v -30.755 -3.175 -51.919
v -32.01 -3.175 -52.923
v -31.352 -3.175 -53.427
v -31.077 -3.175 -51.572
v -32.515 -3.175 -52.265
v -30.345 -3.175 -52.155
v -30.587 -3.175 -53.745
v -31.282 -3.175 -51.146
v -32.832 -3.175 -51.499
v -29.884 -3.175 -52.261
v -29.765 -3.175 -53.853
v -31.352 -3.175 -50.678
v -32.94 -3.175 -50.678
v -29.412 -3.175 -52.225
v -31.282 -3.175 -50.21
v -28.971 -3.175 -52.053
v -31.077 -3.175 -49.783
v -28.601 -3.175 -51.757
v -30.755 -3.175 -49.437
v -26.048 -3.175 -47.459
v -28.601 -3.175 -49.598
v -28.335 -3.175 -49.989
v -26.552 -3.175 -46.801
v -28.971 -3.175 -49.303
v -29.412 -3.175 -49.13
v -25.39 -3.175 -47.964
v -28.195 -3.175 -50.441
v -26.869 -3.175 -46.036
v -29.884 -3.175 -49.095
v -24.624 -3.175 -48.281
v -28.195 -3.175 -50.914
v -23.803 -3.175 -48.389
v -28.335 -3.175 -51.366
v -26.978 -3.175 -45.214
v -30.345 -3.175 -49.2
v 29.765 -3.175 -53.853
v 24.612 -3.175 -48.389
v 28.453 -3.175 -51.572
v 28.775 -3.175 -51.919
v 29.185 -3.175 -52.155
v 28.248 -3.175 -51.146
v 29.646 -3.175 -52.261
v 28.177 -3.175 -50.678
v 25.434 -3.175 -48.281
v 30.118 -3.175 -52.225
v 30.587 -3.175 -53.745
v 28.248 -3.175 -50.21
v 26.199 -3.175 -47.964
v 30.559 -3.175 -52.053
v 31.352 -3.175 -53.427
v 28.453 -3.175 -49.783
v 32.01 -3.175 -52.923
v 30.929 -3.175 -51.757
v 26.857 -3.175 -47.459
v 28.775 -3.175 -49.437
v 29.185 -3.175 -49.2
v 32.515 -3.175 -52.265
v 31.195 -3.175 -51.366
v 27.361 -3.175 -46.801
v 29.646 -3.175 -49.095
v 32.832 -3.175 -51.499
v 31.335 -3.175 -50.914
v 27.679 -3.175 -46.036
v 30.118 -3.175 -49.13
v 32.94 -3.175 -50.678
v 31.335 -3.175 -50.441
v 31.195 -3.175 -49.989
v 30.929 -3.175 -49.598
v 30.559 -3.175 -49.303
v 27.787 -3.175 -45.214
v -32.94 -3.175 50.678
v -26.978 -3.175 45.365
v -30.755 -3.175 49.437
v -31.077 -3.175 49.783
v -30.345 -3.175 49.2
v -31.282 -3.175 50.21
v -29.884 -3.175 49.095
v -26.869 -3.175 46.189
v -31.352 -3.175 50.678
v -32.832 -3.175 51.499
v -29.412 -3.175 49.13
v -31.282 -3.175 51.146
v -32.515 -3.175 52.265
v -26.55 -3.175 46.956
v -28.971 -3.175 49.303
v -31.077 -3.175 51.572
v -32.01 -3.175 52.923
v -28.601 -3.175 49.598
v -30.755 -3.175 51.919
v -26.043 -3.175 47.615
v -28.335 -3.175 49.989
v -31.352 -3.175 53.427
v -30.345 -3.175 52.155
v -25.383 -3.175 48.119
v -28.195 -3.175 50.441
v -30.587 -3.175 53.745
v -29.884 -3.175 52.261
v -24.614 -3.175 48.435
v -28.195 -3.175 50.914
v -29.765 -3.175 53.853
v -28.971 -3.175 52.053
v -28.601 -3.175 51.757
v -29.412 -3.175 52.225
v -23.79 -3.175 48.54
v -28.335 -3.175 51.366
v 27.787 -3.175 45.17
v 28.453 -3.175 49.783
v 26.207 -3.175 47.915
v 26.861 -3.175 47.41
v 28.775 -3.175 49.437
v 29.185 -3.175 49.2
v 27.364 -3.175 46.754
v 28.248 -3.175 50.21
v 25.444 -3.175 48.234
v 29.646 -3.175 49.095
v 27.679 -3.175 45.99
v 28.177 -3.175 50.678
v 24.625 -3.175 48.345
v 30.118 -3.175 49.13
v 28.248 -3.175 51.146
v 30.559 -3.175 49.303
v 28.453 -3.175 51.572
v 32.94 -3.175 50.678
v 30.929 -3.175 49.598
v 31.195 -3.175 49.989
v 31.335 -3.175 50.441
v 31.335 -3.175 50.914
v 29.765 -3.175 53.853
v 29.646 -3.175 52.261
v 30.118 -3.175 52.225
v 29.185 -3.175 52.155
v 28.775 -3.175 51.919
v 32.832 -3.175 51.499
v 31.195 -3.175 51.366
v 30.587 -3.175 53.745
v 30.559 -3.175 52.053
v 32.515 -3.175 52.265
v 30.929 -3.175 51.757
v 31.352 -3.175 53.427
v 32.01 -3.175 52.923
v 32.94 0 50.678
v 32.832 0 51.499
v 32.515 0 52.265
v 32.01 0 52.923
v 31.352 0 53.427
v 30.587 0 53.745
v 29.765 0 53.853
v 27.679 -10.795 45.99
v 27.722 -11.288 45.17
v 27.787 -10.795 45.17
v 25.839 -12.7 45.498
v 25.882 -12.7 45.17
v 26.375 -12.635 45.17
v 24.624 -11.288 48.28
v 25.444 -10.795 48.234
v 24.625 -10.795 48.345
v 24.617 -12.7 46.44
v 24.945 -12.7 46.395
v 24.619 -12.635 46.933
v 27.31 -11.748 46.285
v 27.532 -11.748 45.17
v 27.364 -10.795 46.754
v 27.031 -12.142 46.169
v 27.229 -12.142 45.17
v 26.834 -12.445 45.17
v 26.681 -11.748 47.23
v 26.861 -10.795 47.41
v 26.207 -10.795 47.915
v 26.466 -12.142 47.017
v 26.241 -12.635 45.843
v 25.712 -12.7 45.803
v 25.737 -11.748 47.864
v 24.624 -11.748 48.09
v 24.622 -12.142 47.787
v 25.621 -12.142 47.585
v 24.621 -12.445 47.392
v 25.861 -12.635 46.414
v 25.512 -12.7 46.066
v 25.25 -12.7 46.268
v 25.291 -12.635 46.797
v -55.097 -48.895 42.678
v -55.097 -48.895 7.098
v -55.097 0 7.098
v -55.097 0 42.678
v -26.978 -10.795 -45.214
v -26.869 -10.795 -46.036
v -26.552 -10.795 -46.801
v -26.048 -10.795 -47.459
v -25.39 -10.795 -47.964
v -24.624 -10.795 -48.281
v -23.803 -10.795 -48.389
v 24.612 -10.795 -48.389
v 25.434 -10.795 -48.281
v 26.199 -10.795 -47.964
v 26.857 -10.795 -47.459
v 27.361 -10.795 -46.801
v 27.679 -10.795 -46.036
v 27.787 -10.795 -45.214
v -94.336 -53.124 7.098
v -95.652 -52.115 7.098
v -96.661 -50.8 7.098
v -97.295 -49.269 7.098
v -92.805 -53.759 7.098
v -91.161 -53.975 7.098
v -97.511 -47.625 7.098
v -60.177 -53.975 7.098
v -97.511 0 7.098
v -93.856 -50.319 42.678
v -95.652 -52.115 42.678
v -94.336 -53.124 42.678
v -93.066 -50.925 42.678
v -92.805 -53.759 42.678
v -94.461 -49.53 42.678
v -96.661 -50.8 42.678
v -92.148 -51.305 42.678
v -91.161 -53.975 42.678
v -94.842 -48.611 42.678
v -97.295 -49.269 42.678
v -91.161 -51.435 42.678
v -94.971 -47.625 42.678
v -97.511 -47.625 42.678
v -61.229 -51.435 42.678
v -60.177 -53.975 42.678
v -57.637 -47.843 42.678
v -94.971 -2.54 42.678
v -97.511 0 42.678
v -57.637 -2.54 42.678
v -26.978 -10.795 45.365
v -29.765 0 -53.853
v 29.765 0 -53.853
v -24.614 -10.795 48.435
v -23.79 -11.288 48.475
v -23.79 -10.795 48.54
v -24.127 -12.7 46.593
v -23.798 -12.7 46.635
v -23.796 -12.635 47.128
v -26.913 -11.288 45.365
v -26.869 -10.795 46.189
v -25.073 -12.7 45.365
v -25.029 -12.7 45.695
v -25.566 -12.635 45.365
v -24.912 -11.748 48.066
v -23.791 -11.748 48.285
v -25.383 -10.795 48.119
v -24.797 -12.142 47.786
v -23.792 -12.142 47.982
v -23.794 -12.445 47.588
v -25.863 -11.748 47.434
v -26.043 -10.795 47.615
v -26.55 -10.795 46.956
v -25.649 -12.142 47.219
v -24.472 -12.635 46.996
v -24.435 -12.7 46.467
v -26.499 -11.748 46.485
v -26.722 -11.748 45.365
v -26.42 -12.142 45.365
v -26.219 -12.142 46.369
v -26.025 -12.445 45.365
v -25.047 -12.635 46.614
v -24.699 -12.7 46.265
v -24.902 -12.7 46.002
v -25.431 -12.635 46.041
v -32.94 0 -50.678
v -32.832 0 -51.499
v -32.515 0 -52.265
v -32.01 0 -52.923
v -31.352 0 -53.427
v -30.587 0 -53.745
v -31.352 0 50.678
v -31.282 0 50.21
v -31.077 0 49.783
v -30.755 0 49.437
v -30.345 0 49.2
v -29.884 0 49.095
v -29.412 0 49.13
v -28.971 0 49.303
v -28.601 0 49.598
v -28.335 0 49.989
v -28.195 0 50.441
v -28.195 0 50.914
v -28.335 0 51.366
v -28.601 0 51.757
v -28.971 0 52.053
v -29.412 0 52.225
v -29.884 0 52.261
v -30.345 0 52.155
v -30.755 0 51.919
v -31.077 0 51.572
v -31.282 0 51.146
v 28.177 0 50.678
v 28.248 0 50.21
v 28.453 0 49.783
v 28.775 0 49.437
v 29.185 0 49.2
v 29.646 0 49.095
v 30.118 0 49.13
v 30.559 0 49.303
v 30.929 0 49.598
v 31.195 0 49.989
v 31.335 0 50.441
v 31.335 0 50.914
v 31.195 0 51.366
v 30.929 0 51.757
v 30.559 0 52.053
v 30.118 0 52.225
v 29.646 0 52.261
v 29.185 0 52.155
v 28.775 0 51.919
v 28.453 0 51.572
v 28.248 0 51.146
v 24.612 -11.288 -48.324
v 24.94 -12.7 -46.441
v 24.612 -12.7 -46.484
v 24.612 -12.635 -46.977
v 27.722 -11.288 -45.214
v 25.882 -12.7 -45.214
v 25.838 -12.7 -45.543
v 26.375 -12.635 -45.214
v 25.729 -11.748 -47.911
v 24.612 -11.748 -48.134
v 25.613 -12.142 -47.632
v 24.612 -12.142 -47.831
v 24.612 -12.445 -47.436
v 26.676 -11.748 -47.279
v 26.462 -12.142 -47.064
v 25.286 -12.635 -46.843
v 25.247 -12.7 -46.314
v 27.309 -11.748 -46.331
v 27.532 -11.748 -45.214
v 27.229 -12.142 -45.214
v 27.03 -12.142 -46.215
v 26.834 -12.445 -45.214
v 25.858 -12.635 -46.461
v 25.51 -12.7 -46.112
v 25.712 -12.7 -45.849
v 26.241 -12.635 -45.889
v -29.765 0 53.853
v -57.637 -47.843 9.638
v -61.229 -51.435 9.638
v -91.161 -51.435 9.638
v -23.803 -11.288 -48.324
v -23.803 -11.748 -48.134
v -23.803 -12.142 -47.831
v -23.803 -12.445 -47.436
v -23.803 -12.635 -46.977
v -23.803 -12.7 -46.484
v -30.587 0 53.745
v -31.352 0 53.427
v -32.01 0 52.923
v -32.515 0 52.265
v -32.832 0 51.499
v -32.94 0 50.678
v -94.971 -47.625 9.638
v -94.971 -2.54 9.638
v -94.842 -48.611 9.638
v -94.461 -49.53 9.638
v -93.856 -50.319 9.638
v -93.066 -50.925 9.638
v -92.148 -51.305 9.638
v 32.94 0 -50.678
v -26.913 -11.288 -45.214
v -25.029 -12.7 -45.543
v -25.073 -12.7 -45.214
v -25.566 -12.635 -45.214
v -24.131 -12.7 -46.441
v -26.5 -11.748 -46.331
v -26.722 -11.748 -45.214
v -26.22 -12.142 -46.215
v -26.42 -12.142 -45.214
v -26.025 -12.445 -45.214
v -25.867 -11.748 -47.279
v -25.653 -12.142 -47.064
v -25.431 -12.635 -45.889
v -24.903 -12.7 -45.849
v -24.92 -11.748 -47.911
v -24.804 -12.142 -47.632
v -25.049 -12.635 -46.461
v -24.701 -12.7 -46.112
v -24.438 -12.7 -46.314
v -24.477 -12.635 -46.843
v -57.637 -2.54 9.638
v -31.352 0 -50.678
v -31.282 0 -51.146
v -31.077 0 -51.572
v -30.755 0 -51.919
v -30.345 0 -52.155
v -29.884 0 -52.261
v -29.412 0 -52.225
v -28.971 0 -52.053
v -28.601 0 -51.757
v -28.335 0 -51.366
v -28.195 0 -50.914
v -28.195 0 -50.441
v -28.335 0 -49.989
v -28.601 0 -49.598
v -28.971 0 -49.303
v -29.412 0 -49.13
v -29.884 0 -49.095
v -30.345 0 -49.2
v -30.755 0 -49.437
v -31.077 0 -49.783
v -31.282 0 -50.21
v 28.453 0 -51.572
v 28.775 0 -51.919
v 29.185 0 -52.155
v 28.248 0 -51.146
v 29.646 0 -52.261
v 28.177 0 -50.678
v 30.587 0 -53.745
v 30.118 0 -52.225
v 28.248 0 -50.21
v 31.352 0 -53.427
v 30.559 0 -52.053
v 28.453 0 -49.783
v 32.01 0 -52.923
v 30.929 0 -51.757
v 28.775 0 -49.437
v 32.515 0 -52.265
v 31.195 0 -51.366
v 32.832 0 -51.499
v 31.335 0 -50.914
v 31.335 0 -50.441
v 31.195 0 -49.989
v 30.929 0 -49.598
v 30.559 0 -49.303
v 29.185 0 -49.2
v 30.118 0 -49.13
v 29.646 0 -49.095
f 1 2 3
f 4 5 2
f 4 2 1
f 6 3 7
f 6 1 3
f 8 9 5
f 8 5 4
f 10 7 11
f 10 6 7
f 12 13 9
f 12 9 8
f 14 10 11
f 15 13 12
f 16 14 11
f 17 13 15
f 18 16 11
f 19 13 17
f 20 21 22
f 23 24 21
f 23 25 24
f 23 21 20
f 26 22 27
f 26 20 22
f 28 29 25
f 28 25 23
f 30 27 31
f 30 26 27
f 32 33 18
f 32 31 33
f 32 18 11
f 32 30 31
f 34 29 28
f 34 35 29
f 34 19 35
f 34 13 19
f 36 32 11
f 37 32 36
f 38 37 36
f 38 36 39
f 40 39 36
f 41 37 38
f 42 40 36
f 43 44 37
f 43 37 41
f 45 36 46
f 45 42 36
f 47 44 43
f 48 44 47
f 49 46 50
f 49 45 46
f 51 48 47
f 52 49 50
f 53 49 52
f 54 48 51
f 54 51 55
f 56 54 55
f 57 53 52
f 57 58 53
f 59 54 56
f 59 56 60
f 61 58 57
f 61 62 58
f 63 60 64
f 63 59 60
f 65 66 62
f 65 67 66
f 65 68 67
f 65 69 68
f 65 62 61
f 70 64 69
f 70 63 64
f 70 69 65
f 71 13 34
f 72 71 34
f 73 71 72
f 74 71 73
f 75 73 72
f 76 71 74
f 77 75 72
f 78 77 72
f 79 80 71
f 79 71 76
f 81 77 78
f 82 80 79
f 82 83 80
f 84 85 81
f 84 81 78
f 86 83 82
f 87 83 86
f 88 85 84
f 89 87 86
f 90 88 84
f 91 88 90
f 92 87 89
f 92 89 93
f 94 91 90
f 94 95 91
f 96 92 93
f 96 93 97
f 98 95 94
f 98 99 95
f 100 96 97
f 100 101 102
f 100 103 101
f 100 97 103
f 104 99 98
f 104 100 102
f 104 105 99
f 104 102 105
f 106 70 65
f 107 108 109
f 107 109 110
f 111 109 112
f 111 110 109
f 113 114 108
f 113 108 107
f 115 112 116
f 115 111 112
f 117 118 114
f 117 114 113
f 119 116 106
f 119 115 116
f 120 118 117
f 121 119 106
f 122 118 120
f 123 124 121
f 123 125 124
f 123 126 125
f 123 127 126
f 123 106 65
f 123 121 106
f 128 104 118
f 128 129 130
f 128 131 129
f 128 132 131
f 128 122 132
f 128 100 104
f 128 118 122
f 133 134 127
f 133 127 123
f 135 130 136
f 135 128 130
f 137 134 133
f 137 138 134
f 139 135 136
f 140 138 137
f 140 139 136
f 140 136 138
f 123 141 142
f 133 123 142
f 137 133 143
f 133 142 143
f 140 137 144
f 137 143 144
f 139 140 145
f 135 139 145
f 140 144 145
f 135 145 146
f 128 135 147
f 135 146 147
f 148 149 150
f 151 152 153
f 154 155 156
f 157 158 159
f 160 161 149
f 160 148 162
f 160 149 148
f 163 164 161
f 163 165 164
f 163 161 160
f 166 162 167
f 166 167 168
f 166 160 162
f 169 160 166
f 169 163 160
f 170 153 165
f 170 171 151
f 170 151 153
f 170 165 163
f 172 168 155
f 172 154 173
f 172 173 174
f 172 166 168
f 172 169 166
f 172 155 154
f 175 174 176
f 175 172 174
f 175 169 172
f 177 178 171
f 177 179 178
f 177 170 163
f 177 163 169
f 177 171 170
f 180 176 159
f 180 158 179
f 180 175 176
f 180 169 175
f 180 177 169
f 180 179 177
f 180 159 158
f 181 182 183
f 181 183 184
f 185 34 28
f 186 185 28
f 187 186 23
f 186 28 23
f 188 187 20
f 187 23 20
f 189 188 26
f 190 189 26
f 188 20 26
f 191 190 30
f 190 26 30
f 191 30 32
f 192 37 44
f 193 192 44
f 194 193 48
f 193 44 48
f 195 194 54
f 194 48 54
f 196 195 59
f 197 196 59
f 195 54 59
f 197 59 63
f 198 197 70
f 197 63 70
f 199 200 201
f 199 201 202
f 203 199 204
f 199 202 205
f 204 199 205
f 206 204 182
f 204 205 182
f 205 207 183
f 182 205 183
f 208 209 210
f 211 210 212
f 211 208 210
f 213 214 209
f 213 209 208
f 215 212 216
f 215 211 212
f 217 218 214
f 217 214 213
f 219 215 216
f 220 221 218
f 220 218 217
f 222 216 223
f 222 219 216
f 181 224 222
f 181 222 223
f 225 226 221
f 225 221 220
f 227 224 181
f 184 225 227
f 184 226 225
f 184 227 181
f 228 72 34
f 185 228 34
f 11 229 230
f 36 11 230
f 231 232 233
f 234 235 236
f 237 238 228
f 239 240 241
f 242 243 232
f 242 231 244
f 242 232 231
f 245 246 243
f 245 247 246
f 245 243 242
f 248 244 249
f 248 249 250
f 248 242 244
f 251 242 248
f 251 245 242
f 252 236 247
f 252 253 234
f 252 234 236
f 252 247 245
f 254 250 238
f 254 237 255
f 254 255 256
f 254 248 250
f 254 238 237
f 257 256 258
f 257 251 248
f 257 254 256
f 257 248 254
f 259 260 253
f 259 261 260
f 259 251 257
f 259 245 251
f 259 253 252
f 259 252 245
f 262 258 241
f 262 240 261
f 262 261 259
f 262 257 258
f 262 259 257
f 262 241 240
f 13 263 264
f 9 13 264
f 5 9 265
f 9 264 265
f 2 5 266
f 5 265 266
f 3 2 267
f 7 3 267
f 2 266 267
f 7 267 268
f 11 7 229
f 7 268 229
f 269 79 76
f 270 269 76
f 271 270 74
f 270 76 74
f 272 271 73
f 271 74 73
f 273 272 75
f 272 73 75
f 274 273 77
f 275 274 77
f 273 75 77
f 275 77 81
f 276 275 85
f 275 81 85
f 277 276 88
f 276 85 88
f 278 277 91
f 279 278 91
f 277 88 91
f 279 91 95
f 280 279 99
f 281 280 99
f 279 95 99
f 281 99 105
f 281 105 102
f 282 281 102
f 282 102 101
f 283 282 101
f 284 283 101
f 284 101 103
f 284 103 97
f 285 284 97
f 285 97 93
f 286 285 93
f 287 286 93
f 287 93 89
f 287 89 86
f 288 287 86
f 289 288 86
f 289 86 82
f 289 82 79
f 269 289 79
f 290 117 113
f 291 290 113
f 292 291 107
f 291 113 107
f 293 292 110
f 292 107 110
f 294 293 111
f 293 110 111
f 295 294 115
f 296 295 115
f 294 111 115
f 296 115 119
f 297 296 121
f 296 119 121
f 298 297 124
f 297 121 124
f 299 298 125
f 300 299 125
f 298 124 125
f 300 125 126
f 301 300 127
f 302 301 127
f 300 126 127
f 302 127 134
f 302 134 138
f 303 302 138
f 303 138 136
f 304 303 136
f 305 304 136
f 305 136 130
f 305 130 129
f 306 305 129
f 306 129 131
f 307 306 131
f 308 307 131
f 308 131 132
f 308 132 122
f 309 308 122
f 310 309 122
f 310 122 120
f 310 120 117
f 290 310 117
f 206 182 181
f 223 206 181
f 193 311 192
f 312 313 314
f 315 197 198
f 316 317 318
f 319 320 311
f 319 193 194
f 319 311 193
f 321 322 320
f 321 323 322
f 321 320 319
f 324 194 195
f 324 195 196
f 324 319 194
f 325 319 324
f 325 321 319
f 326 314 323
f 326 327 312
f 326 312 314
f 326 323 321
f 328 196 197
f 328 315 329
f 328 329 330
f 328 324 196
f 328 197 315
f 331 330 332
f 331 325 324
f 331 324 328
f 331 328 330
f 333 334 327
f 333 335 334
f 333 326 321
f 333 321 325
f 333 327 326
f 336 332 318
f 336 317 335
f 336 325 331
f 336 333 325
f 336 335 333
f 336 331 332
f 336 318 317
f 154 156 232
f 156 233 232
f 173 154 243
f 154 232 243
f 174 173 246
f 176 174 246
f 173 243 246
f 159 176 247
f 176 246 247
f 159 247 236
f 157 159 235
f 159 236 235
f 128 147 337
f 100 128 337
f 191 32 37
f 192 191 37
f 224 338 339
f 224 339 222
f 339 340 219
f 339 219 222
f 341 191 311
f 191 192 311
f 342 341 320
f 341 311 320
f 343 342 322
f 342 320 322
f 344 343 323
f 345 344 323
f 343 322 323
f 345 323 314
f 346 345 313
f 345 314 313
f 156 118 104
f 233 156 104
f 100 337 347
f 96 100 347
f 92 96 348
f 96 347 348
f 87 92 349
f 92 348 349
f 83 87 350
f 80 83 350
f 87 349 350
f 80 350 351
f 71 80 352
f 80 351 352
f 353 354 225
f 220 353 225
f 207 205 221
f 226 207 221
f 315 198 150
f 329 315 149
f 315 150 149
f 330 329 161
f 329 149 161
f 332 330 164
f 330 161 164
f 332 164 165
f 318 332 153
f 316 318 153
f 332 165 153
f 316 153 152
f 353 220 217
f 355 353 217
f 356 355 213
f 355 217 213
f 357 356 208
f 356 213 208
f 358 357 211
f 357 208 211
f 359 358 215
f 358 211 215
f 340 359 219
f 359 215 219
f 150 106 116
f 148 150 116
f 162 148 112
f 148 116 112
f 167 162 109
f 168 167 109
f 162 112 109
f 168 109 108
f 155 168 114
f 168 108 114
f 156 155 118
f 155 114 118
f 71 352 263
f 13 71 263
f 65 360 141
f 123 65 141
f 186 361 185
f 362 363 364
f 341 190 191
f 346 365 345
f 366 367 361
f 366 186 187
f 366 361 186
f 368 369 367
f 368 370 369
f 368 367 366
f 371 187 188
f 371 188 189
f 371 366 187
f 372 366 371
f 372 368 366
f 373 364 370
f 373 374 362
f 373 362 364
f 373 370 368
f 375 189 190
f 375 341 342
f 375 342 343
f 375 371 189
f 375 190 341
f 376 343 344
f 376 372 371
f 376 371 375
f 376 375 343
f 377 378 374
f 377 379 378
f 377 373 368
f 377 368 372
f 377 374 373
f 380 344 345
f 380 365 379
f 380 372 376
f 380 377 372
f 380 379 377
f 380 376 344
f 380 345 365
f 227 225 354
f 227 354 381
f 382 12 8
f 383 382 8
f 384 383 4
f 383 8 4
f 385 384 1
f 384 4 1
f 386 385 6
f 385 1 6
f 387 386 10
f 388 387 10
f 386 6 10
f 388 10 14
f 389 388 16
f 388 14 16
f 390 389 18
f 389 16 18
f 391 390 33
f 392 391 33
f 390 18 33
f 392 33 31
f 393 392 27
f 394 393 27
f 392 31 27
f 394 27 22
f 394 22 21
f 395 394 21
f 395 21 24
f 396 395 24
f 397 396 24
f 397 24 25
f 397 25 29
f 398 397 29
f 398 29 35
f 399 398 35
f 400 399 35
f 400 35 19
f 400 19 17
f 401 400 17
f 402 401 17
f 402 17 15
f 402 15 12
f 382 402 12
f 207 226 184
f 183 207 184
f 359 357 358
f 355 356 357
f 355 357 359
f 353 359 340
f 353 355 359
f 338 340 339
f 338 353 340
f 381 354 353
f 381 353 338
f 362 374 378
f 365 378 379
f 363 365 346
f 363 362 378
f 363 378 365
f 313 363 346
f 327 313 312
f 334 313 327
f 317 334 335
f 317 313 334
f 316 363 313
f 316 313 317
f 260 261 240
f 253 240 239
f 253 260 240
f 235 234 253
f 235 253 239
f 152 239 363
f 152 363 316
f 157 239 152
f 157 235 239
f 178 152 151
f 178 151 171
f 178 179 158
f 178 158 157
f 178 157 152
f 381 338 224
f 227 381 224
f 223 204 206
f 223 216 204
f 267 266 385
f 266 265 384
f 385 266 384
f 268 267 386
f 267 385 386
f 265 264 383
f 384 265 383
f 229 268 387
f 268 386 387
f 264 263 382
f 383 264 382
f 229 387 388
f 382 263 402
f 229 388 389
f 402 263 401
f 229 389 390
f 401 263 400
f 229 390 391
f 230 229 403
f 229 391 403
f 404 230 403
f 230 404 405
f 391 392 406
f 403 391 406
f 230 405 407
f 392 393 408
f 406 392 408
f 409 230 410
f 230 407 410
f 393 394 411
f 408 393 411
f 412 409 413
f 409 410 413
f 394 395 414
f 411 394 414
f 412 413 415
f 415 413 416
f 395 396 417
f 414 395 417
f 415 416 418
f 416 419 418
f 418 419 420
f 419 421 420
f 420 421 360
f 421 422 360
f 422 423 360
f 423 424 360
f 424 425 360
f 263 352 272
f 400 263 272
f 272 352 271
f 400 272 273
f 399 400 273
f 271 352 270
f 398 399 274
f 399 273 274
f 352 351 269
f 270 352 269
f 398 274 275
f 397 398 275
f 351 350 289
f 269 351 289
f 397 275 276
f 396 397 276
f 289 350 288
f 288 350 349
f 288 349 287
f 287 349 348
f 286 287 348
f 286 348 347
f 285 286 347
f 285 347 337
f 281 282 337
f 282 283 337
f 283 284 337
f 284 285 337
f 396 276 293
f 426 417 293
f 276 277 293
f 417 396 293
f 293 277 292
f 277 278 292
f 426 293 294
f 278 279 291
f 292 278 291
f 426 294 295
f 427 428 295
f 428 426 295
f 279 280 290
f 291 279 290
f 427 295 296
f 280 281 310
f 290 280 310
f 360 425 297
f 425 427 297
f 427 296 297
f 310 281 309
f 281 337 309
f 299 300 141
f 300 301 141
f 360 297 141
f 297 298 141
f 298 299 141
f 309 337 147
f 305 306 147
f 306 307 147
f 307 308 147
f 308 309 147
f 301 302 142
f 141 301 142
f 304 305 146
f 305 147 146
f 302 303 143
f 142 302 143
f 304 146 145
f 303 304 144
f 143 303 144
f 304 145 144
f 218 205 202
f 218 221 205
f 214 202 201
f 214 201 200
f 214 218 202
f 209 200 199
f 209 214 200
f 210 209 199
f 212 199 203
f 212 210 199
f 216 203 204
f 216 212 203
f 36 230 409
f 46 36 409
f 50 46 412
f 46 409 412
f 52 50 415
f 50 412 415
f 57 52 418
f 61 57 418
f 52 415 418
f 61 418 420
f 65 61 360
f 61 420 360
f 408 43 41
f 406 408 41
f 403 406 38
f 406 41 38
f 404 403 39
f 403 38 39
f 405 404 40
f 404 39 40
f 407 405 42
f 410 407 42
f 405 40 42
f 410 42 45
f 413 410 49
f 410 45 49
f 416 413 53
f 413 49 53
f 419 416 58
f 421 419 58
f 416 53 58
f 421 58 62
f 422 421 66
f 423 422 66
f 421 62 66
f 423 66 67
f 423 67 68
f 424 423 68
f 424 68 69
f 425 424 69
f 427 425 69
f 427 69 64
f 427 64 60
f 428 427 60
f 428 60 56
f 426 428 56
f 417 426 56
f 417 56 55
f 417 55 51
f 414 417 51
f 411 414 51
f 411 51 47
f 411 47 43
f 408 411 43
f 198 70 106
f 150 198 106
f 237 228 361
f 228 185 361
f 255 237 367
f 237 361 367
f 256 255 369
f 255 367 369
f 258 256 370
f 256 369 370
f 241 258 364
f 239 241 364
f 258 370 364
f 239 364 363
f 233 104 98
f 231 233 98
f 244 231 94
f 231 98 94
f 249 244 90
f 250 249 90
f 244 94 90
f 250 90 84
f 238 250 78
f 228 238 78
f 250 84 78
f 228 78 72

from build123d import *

# Parameters (mm, degrees)
F1_DEPTH = 12.7
F2_DEPTH = 3.175
F0_W     = 42.4149371684
F0_H     = 35.5794732459
F3_D     = 3.175
F4_D     = 3.175
F5_R     = 1.905
F6_DEPTH = 50.8
F7_R     = 6.35
F8_SIZE  = 5.08
F9_T     = -2.54


with BuildPart() as f1:
    # F0 (on Front) → F1 (new body)
    with BuildSketch(Plane.XZ):
        with BuildLine():
            ThreePointArc((-23.7898464417, 48.540072385), (-26.0431820434, 47.6146840466), (-26.9776489586, 45.3650981968))
            Line((-26.9776489586, 45.3650981968), (-26.9776489586, -45.2139356256))
            ThreePointArc((-26.9776489586, -45.2139356256), (-26.0477129888, -47.4589996558), (-23.8026489586, -48.3889356256))
            Line((-23.8026489586, -48.3889356256), (24.6117726982, -48.3889356256))
            ThreePointArc((24.6117726982, -48.3889356256), (26.8568367284, -47.4589996558), (27.7867726982, -45.2139356256))
            Line((27.7867726982, -45.2139356256), (27.7867726982, 45.1698756804))
            ThreePointArc((27.7867726982, 45.1698756804), (26.8613585479, 47.4104087653), (24.624575215, 48.3448498686))
            Line((24.624575215, 48.3448498686), (-23.7898464417, 48.540072385))
        make_face()
    extrude(amount=F1_DEPTH)

    # F0 (on Front) → F2 (join)
    with BuildSketch(Plane.XZ):
        with BuildLine():
            Line((29.7649071634, 53.8527071476), (-29.7649071634, 53.8527071476))
            ThreePointArc((-29.7649071634, 53.8527071476), (-32.0099711936, 52.9227711779), (-32.9399071634, 50.6777071476))
            Line((-32.9399071634, 50.6777071476), (-32.9399071634, -50.6777071476))
            ThreePointArc((-32.9399071634, -50.6777071476), (-32.0099711936, -52.9227711779), (-29.7649071634, -53.8527071476))
            Line((-29.7649071634, -53.8527071476), (29.7649071634, -53.8527071476))
            ThreePointArc((29.7649071634, -53.8527071476), (32.0099711936, -52.9227711779), (32.9399071634, -50.6777071476))
            Line((32.9399071634, -50.6777071476), (32.9399071634, 50.6777071476))
            ThreePointArc((32.9399071634, 50.6777071476), (32.0099711936, 52.9227711779), (29.7649071634, 53.8527071476))
        make_face()
        with BuildLine():
            Line((-26.9776489586, -45.2139356256), (-26.9776489586, 45.3650981968))
            ThreePointArc((-26.9776489586, 45.3650981968), (-26.0431820434, 47.6146840466), (-23.7898464417, 48.540072385))
            Line((-23.7898464417, 48.540072385), (24.624575215, 48.3448498686))
            ThreePointArc((24.624575215, 48.3448498686), (26.8613585479, 47.4104087653), (27.7867726982, 45.1698756804))
            Line((27.7867726982, 45.1698756804), (27.7867726982, -45.2139356256))
            ThreePointArc((27.7867726982, -45.2139356256), (26.8568367284, -47.4589996558), (24.6117726982, -48.3889356256))
            Line((24.6117726982, -48.3889356256), (-23.8026489586, -48.3889356256))
            ThreePointArc((-23.8026489586, -48.3889356256), (-26.0477129888, -47.4589996558), (-26.9776489586, -45.2139356256))
        make_face(mode=Mode.SUBTRACT)
    extrude(amount=F2_DEPTH)

    # F3 (through all)
    with Locations(Plane(origin=(0, 0, 0), x_dir=(1, 0, 0), z_dir=(0, 1, 0))):
        with Locations((-29.7649071634, -50.6777071476)):
            Hole(F3_D / 2)

    # F4 (through all)
    with Locations(Plane(origin=(0, 0, 0), x_dir=(1, 0, 0), z_dir=(0, 1, 0))):
        with Locations((29.7649071634, -50.6777071476), (-29.7649071634, 50.6777071476), (29.7649071634, 50.6777071476)):
            Hole(F4_D / 2)

    # F5
    f5_edges = [f1.edges().sort_by_distance(p)[0] for p in [
        (26.861359, -12.7, 47.410409),
        (0.417364, -12.7, 48.442461),
        (-26.043182, -12.7, 47.614684),
        (-26.977649, -12.7, 0.075581),
        (-26.047713, -12.7, -47.459),
        (0.404562, -12.7, -48.388936),
        (26.856837, -12.7, -47.459),
        (27.786773, -12.7, -0.02203),
    ]]
    fillet(f5_edges, radius=F5_R)


with BuildPart() as f2:
    # F0 (on Front) → F2, piece 2 (new body)
    with BuildSketch(Plane.XZ):
        with Locations((-76.3040240854, 24.8881017324)):
            Rectangle(F0_W, F0_H)
    extrude(amount=F2_DEPTH)

    # F6 (add): a face of the model
    f6_faces = [f2.faces().sort_by_distance(p)[0] for p in [
        (-76.3040240854, -3.175, 24.8881017324),
    ]]
    extrude(f6_faces, amount=F6_DEPTH)

    # F7
    f7_edges = [f2.edges().sort_by_distance(p)[0] for p in [
        (-97.511493, -53.975, 24.888102),
    ]]
    fillet(f7_edges, radius=F7_R)

    # F8
    f8_edges = [f2.edges().sort_by_distance(p)[0] for p in [
        (-55.096556, -53.975, 24.888102),
    ]]
    chamfer(f8_edges, length=F8_SIZE)

    # F9
    f9_openings = [f2.faces().sort_by_distance(p)[0] for p in [
        (-76.339545, -26.746017, 42.677838),
    ]]
    offset(amount=F9_T, openings=f9_openings)


solid = Compound([f1.part, f2.part])
